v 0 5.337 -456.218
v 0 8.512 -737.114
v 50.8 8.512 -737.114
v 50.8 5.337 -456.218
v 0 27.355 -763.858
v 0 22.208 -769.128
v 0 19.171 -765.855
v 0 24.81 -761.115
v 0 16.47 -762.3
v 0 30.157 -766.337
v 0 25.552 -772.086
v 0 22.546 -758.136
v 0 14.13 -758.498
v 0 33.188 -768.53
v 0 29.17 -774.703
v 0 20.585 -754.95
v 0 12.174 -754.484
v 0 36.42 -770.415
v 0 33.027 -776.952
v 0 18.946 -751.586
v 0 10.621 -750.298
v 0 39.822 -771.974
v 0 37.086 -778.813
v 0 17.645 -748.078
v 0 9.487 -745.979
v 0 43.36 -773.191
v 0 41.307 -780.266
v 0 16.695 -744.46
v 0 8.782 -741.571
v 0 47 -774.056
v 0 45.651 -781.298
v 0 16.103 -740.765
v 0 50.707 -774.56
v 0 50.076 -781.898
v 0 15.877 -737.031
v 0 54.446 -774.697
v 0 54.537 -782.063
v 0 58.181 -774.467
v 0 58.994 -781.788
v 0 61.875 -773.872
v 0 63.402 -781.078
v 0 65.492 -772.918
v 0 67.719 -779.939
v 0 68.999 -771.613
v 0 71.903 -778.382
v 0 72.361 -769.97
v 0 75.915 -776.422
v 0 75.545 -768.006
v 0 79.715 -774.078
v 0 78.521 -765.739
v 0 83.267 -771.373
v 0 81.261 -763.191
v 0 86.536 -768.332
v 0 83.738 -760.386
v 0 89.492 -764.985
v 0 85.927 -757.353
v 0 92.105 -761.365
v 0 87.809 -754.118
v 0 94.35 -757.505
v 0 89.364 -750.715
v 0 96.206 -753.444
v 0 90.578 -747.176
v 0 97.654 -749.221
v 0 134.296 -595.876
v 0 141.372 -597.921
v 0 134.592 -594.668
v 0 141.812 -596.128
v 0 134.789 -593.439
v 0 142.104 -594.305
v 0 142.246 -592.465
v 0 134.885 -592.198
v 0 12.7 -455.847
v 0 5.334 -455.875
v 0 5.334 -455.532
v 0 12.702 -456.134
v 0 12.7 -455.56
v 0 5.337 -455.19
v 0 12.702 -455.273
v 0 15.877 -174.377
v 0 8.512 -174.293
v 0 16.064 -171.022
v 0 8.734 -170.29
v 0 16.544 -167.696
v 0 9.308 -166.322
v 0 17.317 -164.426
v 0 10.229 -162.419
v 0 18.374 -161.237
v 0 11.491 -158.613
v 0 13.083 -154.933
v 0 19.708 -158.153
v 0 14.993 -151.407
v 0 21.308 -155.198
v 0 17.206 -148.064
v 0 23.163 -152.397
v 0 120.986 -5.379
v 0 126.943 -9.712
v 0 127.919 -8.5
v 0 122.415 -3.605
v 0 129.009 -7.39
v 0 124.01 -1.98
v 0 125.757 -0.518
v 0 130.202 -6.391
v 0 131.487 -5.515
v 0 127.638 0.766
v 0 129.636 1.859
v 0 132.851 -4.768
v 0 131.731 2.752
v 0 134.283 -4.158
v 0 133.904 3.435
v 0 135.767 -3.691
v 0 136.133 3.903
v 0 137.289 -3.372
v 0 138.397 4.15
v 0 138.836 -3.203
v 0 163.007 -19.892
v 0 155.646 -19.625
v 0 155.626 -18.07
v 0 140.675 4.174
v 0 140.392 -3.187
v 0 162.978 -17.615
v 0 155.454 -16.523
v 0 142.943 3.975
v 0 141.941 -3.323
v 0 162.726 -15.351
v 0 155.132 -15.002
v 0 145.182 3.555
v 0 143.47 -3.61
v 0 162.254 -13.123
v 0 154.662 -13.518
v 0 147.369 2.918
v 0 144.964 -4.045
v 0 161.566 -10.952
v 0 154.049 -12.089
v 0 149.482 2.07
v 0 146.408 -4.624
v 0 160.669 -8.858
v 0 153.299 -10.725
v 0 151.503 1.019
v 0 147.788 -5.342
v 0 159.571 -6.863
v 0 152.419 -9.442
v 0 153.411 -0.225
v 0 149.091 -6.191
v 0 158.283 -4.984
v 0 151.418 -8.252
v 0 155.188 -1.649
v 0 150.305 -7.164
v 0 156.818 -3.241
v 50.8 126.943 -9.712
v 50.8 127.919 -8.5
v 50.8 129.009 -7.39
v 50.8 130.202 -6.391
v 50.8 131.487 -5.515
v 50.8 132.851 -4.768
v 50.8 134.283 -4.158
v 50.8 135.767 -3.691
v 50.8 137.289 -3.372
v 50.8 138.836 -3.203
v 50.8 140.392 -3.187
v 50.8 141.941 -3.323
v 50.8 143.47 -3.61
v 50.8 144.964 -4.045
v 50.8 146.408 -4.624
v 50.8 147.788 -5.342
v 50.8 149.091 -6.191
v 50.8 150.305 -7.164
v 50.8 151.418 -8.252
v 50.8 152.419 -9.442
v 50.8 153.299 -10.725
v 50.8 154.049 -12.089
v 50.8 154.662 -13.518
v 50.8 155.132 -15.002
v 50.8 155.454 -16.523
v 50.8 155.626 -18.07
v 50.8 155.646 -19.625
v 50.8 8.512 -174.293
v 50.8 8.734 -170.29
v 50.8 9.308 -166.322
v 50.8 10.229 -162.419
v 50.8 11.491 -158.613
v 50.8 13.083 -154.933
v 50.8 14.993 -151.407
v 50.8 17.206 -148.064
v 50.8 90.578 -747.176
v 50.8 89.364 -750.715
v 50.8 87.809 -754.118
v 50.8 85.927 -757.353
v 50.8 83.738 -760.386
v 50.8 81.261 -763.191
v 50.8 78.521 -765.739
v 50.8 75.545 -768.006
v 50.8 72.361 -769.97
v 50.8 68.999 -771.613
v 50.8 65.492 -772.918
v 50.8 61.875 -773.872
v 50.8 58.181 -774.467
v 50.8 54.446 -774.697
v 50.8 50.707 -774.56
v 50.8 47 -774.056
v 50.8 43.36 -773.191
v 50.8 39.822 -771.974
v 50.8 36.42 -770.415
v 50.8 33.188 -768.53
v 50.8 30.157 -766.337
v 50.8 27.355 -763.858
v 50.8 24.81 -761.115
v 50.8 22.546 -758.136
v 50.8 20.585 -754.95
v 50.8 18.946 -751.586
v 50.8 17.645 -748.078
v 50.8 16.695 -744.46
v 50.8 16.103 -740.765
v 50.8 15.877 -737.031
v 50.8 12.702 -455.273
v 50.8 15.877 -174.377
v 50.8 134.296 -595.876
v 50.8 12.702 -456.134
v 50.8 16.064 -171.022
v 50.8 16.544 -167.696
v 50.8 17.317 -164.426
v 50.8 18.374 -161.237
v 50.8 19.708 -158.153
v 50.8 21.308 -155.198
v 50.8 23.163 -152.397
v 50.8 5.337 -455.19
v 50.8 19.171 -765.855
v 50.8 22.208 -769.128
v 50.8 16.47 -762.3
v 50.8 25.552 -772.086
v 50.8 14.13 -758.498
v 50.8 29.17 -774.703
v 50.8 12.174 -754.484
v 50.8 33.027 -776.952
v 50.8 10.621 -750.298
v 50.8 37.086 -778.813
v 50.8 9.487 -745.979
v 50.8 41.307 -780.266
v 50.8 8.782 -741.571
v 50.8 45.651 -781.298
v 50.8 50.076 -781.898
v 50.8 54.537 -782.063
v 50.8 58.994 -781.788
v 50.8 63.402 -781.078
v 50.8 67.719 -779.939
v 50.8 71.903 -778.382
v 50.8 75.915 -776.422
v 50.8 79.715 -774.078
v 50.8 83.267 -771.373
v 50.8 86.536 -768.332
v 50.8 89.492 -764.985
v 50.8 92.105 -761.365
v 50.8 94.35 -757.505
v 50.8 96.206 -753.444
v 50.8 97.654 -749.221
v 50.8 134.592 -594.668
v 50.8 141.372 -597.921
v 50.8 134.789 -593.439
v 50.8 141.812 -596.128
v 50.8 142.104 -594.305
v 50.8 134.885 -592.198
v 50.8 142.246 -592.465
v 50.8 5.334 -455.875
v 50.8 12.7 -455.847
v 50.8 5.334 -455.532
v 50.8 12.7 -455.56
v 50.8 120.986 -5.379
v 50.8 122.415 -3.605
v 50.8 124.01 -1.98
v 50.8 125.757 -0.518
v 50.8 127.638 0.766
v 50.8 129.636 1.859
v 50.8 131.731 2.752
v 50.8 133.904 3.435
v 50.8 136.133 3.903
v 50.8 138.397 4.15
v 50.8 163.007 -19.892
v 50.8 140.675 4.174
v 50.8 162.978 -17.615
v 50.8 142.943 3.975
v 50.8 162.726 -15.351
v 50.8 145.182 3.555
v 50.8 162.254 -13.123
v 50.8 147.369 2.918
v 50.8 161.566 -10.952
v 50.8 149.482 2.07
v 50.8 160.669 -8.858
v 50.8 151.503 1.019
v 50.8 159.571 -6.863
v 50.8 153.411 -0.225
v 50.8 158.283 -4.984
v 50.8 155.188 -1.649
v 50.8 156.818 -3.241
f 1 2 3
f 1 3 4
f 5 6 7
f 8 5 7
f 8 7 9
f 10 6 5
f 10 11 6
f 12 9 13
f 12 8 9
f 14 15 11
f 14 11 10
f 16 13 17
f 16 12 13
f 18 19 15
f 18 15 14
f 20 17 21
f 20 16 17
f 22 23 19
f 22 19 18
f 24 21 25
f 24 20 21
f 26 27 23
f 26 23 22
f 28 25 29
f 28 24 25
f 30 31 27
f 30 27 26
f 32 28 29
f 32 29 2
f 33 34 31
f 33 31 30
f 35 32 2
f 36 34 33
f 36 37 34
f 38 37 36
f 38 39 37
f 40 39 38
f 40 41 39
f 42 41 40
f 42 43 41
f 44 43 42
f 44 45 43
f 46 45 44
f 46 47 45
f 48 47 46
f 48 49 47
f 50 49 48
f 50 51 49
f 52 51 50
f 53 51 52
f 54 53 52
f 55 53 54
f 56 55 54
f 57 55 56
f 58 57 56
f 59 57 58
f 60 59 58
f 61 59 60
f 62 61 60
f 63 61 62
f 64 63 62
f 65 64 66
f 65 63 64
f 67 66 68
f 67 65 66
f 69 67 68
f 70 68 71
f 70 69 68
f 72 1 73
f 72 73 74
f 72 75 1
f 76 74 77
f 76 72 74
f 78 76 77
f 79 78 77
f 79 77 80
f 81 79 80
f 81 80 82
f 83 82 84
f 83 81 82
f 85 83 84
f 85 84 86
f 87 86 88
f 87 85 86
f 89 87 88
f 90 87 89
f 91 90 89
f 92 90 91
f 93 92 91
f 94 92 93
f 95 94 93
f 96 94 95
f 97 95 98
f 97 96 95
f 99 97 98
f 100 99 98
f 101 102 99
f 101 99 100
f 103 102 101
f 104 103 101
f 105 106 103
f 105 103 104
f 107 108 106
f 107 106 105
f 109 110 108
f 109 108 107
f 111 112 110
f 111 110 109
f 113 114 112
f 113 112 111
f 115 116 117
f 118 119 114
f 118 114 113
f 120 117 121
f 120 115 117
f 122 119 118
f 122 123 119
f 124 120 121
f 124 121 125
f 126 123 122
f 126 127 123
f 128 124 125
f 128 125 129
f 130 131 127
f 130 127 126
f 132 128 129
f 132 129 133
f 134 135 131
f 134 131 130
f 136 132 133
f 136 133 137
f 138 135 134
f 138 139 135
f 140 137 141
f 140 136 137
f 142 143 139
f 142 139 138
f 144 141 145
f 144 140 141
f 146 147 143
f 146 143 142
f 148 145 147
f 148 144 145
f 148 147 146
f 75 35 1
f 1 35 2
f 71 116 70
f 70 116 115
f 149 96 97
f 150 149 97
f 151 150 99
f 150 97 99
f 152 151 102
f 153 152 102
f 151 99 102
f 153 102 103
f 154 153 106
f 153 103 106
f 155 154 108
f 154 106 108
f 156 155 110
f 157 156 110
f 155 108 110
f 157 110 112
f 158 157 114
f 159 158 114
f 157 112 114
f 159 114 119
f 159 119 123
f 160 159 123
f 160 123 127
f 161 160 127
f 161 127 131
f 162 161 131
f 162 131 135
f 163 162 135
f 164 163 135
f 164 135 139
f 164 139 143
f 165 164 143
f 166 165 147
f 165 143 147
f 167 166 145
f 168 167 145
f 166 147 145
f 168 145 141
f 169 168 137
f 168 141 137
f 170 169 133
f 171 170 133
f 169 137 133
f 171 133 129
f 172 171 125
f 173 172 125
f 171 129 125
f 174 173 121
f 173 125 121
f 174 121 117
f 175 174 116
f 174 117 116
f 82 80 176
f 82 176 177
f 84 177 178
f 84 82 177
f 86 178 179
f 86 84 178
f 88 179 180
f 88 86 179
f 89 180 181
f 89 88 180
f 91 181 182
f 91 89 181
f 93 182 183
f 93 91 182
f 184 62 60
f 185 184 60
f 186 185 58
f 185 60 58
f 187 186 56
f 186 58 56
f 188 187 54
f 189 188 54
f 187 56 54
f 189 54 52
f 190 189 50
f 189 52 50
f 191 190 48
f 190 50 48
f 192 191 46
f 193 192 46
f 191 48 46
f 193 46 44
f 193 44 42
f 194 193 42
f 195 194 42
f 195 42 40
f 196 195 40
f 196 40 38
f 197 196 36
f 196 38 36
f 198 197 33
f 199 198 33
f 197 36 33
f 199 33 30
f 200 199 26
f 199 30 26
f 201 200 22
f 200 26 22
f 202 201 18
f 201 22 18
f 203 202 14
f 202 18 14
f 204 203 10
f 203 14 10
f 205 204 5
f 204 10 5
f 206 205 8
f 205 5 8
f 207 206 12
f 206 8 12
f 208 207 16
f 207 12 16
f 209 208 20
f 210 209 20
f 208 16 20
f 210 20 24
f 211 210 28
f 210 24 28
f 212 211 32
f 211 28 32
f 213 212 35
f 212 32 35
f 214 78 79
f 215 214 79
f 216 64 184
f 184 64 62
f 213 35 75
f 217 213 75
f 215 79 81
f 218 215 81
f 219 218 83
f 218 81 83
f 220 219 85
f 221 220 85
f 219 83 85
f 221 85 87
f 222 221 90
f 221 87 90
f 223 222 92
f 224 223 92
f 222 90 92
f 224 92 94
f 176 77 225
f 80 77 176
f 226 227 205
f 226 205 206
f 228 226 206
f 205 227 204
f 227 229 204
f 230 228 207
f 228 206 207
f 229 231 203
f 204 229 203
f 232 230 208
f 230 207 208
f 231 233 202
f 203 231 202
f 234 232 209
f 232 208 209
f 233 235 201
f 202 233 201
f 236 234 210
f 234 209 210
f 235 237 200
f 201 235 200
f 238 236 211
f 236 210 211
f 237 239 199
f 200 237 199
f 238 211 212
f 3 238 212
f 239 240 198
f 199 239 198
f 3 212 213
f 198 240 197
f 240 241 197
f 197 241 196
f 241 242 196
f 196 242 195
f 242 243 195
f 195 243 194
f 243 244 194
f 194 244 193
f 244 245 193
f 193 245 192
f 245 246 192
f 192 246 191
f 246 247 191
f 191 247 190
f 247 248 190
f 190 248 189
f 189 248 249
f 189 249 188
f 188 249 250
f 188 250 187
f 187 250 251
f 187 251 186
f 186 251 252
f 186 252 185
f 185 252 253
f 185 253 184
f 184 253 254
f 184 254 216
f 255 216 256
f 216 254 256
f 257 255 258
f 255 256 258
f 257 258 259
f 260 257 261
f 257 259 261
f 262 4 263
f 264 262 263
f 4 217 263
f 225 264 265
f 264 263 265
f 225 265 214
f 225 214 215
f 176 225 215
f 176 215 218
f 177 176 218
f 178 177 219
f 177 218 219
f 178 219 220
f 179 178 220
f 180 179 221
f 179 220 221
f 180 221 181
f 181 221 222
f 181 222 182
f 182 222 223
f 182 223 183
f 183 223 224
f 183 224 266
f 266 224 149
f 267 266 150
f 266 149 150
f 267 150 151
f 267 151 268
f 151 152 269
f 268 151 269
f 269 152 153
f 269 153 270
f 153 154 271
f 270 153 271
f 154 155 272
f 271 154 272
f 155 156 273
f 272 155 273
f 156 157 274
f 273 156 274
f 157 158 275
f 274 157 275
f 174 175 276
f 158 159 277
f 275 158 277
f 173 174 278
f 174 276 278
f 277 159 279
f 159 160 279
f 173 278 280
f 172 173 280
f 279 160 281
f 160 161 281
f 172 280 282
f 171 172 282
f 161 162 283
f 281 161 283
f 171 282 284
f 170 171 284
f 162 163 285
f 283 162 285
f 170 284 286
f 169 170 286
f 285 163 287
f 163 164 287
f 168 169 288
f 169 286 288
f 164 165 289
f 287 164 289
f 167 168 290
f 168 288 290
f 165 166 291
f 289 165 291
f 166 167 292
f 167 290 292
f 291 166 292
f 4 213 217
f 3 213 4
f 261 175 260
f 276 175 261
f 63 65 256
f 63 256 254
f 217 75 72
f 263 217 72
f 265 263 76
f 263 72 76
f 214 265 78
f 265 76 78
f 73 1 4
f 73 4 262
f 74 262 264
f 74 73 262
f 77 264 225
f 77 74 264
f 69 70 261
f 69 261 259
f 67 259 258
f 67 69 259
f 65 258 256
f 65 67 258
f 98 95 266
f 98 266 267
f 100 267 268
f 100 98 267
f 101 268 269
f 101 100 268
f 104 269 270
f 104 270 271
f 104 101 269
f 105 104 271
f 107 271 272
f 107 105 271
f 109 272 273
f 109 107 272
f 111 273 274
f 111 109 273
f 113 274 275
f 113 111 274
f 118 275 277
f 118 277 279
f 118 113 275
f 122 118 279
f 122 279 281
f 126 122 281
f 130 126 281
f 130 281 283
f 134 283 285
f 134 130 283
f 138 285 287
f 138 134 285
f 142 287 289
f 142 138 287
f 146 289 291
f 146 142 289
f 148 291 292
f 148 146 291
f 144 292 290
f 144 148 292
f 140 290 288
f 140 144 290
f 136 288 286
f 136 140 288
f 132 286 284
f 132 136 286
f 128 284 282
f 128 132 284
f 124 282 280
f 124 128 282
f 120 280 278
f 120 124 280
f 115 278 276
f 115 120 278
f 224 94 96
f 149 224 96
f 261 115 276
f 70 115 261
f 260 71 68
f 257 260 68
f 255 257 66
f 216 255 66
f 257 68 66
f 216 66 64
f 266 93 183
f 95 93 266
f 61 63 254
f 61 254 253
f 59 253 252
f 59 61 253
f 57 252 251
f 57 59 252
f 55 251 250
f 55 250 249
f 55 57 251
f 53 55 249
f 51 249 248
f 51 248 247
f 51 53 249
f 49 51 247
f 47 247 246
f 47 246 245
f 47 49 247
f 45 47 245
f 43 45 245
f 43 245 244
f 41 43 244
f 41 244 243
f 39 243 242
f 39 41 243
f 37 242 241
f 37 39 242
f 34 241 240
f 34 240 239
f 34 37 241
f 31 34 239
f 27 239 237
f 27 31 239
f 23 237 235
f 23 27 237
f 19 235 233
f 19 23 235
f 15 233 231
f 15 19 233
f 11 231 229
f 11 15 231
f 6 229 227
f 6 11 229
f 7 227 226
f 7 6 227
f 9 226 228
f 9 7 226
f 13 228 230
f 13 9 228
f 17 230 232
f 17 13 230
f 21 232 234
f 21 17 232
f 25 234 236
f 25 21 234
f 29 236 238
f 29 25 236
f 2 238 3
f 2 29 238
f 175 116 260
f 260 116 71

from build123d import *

# Parameters (mm, degrees)
EXTRUDE_THIN1_DEPTH = 50.8


with BuildPart() as part:
    # Sketch1 → Extrude-Thin1 (new body)
    with BuildSketch(Plane(origin=(0, 0, 0), x_dir=(0, 0, -1), z_dir=(1, 0, 0))):
        with BuildLine():
            Line((737.113874036, 8.511904093), (456.21754645, 5.336904093))
            ThreePointArc((456.21754645, 5.336904093), (455.703672415, 5.334), (455.189798379, 5.336904093))
            Line((455.189798379, 5.336904093), (174.293470793, 8.511904093))
            ThreePointArc((174.293470793, 8.511904093), (160.502158444, 10.818090953), (148.063879552, 17.206205881))
            Line((148.063879552, 17.206205881), (5.379457693, 120.98648949))
            ThreePointArc((5.379457693, 120.98648949), (-2.917750189, 147.368675717), (19.892164793, 163.00744764))
            Line((19.892164793, 163.00744764), (592.464987809, 142.245967303))
            ThreePointArc((592.464987809, 142.245967303), (595.219854288, 141.976498391), (597.921135385, 141.372359959))
            Line((597.921135385, 141.372359959), (749.221113821, 97.654109903))
            ThreePointArc((749.221113821, 97.654109903), (781.652360545, 47.85601599), (737.113874036, 8.511904093))
        make_face()
        with BuildLine():
            Line((737.0306207, 15.877433597), (456.134293115, 12.702433597))
            ThreePointArc((456.134293115, 12.702433597), (455.703672415, 12.7), (455.273051714, 12.702433597))
            Line((455.273051714, 12.702433597), (174.376724129, 15.877433597))
            ThreePointArc((174.376724129, 15.877433597), (162.819758473, 17.809992419), (152.396619736, 23.163161353))
            Line((152.396619736, 23.163161353), (9.712197878, 126.943444962))
            ThreePointArc((9.712197878, 126.943444962), (4.044706155, 144.96406397), (19.625249176, 155.646285228))
            Line((19.625249176, 155.646285228), (592.198072192, 134.884804891))
            ThreePointArc((592.198072192, 134.884804891), (594.055285548, 134.703140457), (595.876373928, 134.29585612))
            Line((595.876373928, 134.29585612), (747.176352364, 90.577606064))
            ThreePointArc((747.176352364, 90.577606064), (774.353374758, 48.847359768), (737.0306207, 15.877433597))
        make_face(mode=Mode.SUBTRACT)
    extrude(amount=EXTRUDE_THIN1_DEPTH)


solid = part.part
